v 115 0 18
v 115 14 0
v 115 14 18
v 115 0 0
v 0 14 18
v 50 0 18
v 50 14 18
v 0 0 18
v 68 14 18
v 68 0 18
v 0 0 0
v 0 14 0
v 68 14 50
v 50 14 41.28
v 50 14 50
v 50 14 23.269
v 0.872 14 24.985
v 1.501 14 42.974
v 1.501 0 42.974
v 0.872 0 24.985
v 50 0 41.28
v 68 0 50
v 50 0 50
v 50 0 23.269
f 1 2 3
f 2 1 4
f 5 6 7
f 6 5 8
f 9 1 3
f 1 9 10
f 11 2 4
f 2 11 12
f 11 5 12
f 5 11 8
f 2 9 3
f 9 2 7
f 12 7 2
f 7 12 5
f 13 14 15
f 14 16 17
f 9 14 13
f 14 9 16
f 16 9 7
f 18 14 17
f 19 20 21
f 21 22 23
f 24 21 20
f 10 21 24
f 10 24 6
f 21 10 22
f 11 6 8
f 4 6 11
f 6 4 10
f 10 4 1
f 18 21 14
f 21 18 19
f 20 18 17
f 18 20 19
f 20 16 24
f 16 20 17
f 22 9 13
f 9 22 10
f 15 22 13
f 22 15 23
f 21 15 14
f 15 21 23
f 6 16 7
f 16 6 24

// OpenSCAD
cube([115,14,18]);
rotate([0,2,0]) translate([0,0,25]) cube([60,14,18]);
translate([50,0,0]) cube([18,14,50]);

//translate([0,14,18])rotate([0,90,0])cube([36,14,18]);
